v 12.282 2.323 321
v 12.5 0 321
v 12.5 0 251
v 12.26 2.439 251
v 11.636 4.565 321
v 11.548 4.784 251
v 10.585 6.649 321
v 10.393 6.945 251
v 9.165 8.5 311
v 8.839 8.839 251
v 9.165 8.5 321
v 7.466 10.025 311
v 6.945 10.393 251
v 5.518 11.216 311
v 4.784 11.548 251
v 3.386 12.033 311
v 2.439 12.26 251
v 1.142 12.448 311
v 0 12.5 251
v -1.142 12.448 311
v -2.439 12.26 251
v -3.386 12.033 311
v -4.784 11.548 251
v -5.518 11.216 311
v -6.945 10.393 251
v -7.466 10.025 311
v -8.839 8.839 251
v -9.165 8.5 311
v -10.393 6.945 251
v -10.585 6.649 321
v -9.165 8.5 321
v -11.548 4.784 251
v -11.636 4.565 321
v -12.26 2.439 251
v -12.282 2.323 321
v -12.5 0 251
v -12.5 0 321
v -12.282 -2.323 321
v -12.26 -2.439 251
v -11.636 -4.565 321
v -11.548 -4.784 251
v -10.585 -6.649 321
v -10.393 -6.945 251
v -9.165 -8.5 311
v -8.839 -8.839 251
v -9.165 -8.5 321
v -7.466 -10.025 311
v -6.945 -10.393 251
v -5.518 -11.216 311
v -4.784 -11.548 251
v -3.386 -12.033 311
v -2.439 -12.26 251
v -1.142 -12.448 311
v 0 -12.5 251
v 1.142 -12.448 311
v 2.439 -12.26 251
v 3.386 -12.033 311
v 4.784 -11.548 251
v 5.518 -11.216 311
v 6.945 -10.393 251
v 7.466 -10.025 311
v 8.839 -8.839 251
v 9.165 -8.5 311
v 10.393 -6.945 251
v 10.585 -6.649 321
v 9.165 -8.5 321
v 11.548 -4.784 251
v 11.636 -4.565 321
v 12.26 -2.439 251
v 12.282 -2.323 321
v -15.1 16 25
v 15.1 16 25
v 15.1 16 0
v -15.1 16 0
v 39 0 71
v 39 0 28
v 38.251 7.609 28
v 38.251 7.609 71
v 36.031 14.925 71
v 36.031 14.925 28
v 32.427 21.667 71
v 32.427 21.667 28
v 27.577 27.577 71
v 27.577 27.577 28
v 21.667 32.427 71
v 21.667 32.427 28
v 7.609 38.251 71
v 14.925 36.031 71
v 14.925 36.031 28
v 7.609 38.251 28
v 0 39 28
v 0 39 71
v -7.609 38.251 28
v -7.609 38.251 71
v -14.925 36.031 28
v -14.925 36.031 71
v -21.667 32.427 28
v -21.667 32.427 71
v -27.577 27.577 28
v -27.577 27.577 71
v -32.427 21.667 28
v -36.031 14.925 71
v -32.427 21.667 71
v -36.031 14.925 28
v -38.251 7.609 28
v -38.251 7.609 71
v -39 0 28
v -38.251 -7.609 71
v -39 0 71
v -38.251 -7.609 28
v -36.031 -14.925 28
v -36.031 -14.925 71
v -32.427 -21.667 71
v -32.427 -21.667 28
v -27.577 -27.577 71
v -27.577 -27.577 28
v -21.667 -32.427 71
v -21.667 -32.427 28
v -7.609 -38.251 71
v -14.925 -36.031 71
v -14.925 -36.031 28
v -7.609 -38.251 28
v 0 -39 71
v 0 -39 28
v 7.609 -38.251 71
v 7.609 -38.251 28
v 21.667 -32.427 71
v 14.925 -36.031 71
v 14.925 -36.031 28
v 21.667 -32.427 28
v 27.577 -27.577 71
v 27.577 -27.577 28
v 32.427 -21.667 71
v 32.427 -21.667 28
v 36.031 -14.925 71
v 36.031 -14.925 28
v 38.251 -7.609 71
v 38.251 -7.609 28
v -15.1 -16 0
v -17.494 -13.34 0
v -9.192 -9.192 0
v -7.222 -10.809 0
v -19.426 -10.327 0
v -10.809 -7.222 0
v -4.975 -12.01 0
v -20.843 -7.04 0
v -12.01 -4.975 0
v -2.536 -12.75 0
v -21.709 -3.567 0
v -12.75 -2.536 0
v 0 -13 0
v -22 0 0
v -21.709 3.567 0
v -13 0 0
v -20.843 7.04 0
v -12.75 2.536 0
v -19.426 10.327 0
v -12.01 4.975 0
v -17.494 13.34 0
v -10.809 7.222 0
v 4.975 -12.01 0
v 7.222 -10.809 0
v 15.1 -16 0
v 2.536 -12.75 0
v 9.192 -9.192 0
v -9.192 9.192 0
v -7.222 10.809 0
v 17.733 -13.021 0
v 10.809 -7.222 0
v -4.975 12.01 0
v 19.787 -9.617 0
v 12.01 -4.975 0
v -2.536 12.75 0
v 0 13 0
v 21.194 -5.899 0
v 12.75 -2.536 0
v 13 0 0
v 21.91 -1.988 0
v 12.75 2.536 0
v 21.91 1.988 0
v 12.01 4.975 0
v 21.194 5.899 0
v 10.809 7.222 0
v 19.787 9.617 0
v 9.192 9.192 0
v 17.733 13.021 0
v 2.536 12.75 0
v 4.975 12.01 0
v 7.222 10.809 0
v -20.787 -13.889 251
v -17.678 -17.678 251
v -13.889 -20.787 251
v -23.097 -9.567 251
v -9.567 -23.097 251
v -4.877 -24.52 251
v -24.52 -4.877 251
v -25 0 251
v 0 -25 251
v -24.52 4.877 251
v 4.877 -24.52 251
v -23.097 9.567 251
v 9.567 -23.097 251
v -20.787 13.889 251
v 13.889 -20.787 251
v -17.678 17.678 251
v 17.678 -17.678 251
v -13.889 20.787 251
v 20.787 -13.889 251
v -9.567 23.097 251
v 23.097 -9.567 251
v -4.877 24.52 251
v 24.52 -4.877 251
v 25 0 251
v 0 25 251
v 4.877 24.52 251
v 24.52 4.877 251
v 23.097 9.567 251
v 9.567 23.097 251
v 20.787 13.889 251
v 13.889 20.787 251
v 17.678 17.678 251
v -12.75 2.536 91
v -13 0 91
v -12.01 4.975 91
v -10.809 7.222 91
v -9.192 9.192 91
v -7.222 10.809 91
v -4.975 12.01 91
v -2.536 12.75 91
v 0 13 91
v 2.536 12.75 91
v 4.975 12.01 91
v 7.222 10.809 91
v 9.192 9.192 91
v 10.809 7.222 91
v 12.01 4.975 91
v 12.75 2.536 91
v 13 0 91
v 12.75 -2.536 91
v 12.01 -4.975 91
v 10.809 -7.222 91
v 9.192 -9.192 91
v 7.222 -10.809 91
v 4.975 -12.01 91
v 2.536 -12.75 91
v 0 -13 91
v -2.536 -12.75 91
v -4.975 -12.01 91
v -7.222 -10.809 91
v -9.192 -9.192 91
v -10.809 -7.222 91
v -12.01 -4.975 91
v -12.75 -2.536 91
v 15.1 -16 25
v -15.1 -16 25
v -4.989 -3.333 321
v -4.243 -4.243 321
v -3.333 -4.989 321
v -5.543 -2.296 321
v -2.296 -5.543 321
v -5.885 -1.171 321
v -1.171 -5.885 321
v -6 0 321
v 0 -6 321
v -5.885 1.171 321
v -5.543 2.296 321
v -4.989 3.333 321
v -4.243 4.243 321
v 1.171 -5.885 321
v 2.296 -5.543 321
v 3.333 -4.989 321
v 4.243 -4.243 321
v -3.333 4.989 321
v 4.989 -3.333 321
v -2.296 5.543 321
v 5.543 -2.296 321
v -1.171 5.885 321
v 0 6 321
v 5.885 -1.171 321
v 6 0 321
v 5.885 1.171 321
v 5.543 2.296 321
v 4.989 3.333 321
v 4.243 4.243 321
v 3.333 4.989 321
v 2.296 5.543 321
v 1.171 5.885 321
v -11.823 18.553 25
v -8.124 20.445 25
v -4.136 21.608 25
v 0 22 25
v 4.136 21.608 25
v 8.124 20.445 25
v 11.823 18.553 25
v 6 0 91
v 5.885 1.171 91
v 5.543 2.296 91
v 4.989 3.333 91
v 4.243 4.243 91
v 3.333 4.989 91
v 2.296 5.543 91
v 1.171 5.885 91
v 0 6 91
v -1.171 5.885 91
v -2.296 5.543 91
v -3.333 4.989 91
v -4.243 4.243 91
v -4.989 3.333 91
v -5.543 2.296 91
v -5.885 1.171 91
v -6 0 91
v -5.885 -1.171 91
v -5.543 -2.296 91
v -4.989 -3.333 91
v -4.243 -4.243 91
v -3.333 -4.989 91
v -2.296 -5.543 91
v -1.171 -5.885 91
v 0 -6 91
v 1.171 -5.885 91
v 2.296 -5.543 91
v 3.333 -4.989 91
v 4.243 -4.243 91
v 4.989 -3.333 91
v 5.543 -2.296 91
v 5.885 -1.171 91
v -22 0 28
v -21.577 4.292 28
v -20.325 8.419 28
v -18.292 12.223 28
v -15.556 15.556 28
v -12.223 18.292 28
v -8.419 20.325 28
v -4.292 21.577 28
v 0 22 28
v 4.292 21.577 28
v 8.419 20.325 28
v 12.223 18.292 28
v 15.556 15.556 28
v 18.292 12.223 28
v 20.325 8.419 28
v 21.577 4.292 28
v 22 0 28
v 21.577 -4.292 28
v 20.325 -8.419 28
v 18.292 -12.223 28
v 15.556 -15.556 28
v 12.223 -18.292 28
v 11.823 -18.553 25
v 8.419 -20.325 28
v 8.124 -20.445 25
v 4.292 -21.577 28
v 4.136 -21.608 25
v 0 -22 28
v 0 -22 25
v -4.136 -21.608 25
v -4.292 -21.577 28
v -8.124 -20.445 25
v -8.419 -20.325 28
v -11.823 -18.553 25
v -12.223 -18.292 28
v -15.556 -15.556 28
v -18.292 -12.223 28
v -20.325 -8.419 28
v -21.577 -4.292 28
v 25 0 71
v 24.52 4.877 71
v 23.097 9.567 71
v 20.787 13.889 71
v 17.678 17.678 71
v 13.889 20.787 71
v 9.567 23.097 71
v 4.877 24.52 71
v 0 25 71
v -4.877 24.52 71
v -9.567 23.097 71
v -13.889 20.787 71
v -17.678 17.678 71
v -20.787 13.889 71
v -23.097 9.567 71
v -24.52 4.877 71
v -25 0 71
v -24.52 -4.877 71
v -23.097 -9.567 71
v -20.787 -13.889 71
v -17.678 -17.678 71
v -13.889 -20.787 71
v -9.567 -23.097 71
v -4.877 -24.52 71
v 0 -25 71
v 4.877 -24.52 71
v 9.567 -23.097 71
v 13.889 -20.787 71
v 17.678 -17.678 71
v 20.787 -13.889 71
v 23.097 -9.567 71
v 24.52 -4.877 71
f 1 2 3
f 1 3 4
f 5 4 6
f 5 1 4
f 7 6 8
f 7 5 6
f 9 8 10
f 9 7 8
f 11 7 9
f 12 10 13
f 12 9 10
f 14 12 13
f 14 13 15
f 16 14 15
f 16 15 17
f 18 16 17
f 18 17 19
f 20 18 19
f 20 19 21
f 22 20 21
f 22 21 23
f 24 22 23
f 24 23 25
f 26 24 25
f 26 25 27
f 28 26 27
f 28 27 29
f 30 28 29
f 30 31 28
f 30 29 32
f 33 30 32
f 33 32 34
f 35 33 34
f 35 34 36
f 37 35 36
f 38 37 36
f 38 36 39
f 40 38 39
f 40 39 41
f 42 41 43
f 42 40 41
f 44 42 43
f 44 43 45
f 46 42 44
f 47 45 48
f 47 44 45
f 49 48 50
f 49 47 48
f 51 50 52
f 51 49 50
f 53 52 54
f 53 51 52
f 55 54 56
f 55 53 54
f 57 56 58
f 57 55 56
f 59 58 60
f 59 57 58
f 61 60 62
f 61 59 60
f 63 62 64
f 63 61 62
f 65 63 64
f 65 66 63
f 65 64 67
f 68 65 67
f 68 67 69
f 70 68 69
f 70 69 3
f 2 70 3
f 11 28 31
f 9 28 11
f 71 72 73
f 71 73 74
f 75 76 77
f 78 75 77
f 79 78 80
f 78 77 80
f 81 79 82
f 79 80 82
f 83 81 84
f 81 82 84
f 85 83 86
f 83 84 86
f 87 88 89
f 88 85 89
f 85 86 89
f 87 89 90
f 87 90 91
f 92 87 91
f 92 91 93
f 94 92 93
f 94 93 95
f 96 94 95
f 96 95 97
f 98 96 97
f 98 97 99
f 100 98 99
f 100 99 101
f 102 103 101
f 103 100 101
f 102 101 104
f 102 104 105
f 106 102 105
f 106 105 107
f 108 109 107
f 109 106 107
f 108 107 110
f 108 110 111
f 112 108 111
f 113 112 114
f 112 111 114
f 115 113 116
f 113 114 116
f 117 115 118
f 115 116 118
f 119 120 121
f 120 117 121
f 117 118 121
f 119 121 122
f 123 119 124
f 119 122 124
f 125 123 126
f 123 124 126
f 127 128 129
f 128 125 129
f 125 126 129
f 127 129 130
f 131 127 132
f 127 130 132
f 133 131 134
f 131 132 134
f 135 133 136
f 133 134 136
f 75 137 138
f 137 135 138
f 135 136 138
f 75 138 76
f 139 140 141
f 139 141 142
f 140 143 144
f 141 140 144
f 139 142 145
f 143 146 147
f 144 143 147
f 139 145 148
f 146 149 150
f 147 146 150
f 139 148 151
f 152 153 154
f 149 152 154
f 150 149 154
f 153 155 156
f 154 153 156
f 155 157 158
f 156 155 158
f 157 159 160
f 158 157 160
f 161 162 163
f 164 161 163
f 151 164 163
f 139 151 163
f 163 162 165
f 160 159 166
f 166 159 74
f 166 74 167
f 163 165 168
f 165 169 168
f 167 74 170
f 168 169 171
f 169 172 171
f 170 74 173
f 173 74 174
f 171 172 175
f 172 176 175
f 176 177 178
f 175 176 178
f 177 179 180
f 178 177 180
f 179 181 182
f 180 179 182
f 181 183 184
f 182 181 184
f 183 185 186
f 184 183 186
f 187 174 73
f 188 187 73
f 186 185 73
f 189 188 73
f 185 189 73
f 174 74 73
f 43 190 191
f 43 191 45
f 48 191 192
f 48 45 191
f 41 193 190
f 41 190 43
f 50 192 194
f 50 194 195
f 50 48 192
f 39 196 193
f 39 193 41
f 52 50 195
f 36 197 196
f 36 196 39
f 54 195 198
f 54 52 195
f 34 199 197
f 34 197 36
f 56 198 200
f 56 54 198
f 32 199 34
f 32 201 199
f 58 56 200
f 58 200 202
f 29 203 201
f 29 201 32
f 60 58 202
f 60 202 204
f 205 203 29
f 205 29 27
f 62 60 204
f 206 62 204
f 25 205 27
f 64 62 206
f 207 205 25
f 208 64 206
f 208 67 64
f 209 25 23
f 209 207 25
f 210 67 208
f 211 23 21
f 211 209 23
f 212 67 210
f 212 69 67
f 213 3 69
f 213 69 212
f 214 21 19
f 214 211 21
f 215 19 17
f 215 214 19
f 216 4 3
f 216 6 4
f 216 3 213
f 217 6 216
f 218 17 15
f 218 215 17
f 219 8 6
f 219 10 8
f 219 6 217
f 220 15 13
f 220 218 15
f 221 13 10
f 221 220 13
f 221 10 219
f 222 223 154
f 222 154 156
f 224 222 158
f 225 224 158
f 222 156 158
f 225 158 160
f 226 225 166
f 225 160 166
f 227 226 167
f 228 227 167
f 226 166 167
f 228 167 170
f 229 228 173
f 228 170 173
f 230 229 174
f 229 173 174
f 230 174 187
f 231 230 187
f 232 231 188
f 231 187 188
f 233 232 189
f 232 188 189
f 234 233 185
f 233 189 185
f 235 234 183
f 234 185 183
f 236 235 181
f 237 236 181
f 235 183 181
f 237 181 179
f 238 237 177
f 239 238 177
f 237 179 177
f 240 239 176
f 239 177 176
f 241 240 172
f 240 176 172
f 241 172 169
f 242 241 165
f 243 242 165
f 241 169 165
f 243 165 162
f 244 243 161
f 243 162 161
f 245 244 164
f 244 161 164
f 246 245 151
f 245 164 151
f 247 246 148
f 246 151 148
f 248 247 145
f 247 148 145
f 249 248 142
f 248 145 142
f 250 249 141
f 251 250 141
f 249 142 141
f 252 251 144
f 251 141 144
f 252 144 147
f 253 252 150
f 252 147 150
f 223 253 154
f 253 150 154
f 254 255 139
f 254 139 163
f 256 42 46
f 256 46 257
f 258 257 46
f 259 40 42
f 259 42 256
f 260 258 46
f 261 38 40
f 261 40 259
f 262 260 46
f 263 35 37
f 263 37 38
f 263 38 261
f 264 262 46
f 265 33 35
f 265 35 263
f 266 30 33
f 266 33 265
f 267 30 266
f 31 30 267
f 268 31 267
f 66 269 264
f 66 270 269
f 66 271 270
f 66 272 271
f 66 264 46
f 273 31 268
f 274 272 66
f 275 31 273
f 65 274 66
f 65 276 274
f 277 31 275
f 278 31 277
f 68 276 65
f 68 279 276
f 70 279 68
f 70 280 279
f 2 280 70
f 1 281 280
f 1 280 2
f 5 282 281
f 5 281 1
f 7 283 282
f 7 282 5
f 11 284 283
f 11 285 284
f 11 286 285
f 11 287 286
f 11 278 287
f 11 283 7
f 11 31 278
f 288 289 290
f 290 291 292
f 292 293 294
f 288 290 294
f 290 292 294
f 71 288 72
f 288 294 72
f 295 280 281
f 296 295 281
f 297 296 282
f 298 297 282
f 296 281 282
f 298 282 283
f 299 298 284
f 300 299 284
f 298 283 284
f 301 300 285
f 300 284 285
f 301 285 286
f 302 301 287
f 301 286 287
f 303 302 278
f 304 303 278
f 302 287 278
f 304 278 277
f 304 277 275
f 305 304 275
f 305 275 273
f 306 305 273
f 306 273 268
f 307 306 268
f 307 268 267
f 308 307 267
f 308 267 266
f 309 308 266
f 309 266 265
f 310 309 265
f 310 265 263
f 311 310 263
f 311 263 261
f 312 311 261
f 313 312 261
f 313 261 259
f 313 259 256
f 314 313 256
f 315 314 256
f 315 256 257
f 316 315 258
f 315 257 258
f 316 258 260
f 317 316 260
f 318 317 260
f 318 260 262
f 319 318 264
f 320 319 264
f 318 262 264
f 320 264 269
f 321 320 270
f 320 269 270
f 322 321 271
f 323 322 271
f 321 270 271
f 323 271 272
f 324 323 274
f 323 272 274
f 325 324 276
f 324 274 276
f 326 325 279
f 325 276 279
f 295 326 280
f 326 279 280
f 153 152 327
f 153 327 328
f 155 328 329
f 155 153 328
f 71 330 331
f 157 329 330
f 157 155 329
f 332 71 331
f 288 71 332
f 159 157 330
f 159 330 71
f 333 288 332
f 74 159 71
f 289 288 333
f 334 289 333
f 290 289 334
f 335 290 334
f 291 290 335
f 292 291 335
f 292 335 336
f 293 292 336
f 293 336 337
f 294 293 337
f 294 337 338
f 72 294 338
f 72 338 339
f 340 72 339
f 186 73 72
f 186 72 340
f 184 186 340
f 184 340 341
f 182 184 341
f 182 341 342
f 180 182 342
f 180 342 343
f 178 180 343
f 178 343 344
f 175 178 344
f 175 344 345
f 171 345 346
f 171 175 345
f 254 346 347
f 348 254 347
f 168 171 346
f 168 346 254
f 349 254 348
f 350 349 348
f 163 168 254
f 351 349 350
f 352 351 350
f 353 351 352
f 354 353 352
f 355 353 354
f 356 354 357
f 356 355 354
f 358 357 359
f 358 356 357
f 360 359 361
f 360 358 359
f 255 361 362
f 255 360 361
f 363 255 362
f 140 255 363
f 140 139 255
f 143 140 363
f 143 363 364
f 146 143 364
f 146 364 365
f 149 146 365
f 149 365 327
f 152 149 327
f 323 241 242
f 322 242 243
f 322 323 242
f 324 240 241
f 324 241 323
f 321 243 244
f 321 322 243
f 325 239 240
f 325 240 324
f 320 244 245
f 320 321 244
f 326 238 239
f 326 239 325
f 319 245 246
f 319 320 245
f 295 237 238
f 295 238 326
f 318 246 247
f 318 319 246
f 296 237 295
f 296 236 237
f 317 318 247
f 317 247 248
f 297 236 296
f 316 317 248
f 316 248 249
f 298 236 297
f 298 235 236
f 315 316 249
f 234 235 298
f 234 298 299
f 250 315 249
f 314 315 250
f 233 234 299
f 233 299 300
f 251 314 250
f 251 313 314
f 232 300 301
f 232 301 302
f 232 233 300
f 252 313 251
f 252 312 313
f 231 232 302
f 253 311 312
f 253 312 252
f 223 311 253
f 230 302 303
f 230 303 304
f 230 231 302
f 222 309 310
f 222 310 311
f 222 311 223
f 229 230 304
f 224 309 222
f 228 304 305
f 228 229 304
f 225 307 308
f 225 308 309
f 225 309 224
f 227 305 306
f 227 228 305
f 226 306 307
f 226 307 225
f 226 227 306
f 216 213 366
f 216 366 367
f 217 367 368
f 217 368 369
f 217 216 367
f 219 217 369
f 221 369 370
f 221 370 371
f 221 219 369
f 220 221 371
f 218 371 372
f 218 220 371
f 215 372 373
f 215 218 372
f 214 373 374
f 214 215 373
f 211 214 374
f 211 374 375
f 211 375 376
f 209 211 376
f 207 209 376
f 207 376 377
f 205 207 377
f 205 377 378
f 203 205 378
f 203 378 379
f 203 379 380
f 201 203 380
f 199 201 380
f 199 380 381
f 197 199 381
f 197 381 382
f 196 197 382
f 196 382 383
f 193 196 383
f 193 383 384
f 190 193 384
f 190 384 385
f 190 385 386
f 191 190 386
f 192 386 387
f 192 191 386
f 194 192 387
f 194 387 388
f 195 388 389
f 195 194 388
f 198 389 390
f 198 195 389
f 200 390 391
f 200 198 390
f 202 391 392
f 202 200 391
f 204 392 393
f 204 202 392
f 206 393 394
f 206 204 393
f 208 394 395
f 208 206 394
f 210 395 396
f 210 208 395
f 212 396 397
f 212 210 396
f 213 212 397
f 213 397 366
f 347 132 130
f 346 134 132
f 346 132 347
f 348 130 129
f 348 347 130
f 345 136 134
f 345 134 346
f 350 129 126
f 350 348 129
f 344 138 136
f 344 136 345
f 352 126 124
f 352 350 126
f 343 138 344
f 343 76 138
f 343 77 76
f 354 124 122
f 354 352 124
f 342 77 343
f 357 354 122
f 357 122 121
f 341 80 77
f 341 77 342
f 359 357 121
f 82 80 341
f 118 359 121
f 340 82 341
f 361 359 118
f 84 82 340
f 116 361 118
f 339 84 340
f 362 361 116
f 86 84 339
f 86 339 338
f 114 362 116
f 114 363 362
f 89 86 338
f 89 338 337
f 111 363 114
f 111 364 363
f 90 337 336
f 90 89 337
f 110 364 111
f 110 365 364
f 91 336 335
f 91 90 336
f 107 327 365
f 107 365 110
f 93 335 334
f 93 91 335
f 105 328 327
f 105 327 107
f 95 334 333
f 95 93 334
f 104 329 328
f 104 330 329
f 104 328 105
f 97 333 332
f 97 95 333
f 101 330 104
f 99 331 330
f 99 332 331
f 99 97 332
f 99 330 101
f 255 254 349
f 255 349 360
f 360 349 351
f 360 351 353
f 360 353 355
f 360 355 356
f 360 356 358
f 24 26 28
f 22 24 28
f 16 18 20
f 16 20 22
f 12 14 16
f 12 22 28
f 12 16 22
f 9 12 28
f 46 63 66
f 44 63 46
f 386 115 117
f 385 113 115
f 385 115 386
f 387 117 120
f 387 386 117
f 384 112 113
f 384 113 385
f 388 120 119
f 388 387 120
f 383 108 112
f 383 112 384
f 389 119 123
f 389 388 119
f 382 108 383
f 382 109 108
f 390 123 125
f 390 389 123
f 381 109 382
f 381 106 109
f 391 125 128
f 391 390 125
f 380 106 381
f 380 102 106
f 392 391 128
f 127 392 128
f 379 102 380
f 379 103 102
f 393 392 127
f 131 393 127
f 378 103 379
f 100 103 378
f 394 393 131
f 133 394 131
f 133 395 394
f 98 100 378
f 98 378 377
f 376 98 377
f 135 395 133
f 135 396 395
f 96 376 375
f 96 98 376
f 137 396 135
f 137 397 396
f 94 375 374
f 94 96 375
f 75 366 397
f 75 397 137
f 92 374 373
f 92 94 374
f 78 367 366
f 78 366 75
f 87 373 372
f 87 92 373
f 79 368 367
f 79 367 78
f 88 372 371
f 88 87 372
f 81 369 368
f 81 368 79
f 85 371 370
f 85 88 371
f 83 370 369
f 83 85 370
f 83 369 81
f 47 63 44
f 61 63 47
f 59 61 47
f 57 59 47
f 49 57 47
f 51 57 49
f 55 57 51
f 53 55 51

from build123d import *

# Parameters (mm, degrees)
SKETCH1_R               = 39
BOSS_EXTRUDE1_DEPTH     = 321
SKETCH2_OUTSIDE_W       = 147.884
SKETCH2_OUTSIDE_H       = 147.884
SKETCH2_OUTSIDE_R       = 25
CUT_EXTRUDE1_DEPTH      = 250
SKETCH3_OUTSIDE_W       = 147.884
SKETCH3_OUTSIDE_H       = 147.884
SKETCH3_OUTSIDE_R       = 22
CUT_EXTRUDE2_DEPTH      = 28
SKETCH4_R               = 13
CUT_EXTRUDE3_DEPTH      = 91
CUT_EXTRUDE4_DEPTH      = 326.703853216
CUT_EXTRUDE4_DEPTH_BACK = 25
CUT_EXTRUDE5_DEPTH      = 326.703853216
CUT_EXTRUDE5_DEPTH_BACK = 25
SKETCH7_OUTSIDE_W       = 147.884
SKETCH7_OUTSIDE_H       = 147.884
SKETCH7_OUTSIDE_R       = 12.5
CUT_EXTRUDE6_DEPTH      = 70
CUT_EXTRUDE7_DEPTH      = 326.703853216
CUT_EXTRUDE7_DEPTH_BACK = 10
CUT_EXTRUDE8_DEPTH      = 326.703853216
CUT_EXTRUDE8_DEPTH_BACK = 10
SKETCH10_R              = 6
CUT_EXTRUDE9_DEPTH      = 326.703853216


with BuildPart() as part:
    # Sketch1 → Boss-Extrude1 (new body)
    with BuildSketch(Plane.XY):
        Circle(SKETCH1_R)
    extrude(amount=BOSS_EXTRUDE1_DEPTH)

    # Sketch2 outside → Cut-Extrude1 (cut)
    with BuildSketch(Plane.XY.offset(321)):
        Rectangle(SKETCH2_OUTSIDE_W, SKETCH2_OUTSIDE_H)
        Circle(SKETCH2_OUTSIDE_R, mode=Mode.SUBTRACT)
    extrude(amount=-CUT_EXTRUDE1_DEPTH, mode=Mode.SUBTRACT)

    # Sketch3 outside → Cut-Extrude2 (cut)
    with BuildSketch(Plane(origin=(0, 0, 0), x_dir=(-1, 0, 0), z_dir=(0, 0, -1))):
        Rectangle(SKETCH3_OUTSIDE_W, SKETCH3_OUTSIDE_H)
        Circle(SKETCH3_OUTSIDE_R, mode=Mode.SUBTRACT)
    extrude(amount=-CUT_EXTRUDE2_DEPTH, mode=Mode.SUBTRACT)

    # Sketch4 → Cut-Extrude3 (cut)
    with BuildSketch(Plane(origin=(0, 0, 0), x_dir=(-1, 0, 0), z_dir=(0, 0, -1))):
        Circle(SKETCH4_R)
    extrude(amount=-CUT_EXTRUDE3_DEPTH, mode=Mode.SUBTRACT)

    # Sketch5 → Cut-Extrude4 (cut, two sides: drawn at the far end of the back side and taken through both)
    with BuildSketch(Plane(origin=(0, 0, 0), x_dir=(-1, 0, 0), z_dir=(0, 0, -1)).offset(-CUT_EXTRUDE4_DEPTH_BACK)):
        Polygon((179.395153858, -16), (15.099668871, -16), (-15.099668871, -16), (-179.395153858, -16), (-179.395153858, -344.590969976), (179.395153858, -344.590969976), align=None)
    extrude(amount=CUT_EXTRUDE4_DEPTH + CUT_EXTRUDE4_DEPTH_BACK, mode=Mode.SUBTRACT)

    # Sketch6 → Cut-Extrude5 (cut, two sides: drawn at the far end of the back side and taken through both)
    with BuildSketch(Plane(origin=(0, 0, 0), x_dir=(-1, 0, 0), z_dir=(0, 0, -1)).offset(-CUT_EXTRUDE5_DEPTH_BACK)):
        Polygon((179.395153858, 16), (15.099668871, 16), (-15.099668871, 16), (-179.395153858, 16), (-179.395153858, 344.590969976), (179.395153858, 344.590969976), align=None)
    extrude(amount=CUT_EXTRUDE5_DEPTH + CUT_EXTRUDE5_DEPTH_BACK, mode=Mode.SUBTRACT)

    # Sketch7 outside → Cut-Extrude6 (cut)
    with BuildSketch(Plane.XY.offset(321)):
        Rectangle(SKETCH7_OUTSIDE_W, SKETCH7_OUTSIDE_H)
        Circle(SKETCH7_OUTSIDE_R, mode=Mode.SUBTRACT)
    extrude(amount=-CUT_EXTRUDE6_DEPTH, mode=Mode.SUBTRACT)

    # Sketch8 → Cut-Extrude7 (cut, two sides: drawn at the far end of the back side and taken through both)
    with BuildSketch(Plane.XY.offset(321).offset(-CUT_EXTRUDE7_DEPTH_BACK)):
        Polygon((-154.459376077, 8.5), (-9.16515139, 8.5), (9.16515139, 8.5), (154.459376077, 8.5), (154.459376077, 299.088449374), (-154.459376077, 299.088449374), align=None)
    extrude(amount=CUT_EXTRUDE7_DEPTH + CUT_EXTRUDE7_DEPTH_BACK, mode=Mode.SUBTRACT)

    # Sketch9 → Cut-Extrude8 (cut, two sides: drawn at the far end of the back side and taken through both)
    with BuildSketch(Plane.XY.offset(321).offset(-CUT_EXTRUDE8_DEPTH_BACK)):
        Polygon((-154.459376077, -8.5), (-9.16515139, -8.5), (9.16515139, -8.5), (154.459376077, -8.5), (154.459376077, -299.088449374), (-154.459376077, -299.088449374), align=None)
    extrude(amount=CUT_EXTRUDE8_DEPTH + CUT_EXTRUDE8_DEPTH_BACK, mode=Mode.SUBTRACT)

    # Sketch10 → Cut-Extrude9 (cut, through all)
    with BuildSketch(Plane.XY.offset(321)):
        Circle(SKETCH10_R)
    extrude(amount=-CUT_EXTRUDE9_DEPTH, mode=Mode.SUBTRACT)


solid = part.part
